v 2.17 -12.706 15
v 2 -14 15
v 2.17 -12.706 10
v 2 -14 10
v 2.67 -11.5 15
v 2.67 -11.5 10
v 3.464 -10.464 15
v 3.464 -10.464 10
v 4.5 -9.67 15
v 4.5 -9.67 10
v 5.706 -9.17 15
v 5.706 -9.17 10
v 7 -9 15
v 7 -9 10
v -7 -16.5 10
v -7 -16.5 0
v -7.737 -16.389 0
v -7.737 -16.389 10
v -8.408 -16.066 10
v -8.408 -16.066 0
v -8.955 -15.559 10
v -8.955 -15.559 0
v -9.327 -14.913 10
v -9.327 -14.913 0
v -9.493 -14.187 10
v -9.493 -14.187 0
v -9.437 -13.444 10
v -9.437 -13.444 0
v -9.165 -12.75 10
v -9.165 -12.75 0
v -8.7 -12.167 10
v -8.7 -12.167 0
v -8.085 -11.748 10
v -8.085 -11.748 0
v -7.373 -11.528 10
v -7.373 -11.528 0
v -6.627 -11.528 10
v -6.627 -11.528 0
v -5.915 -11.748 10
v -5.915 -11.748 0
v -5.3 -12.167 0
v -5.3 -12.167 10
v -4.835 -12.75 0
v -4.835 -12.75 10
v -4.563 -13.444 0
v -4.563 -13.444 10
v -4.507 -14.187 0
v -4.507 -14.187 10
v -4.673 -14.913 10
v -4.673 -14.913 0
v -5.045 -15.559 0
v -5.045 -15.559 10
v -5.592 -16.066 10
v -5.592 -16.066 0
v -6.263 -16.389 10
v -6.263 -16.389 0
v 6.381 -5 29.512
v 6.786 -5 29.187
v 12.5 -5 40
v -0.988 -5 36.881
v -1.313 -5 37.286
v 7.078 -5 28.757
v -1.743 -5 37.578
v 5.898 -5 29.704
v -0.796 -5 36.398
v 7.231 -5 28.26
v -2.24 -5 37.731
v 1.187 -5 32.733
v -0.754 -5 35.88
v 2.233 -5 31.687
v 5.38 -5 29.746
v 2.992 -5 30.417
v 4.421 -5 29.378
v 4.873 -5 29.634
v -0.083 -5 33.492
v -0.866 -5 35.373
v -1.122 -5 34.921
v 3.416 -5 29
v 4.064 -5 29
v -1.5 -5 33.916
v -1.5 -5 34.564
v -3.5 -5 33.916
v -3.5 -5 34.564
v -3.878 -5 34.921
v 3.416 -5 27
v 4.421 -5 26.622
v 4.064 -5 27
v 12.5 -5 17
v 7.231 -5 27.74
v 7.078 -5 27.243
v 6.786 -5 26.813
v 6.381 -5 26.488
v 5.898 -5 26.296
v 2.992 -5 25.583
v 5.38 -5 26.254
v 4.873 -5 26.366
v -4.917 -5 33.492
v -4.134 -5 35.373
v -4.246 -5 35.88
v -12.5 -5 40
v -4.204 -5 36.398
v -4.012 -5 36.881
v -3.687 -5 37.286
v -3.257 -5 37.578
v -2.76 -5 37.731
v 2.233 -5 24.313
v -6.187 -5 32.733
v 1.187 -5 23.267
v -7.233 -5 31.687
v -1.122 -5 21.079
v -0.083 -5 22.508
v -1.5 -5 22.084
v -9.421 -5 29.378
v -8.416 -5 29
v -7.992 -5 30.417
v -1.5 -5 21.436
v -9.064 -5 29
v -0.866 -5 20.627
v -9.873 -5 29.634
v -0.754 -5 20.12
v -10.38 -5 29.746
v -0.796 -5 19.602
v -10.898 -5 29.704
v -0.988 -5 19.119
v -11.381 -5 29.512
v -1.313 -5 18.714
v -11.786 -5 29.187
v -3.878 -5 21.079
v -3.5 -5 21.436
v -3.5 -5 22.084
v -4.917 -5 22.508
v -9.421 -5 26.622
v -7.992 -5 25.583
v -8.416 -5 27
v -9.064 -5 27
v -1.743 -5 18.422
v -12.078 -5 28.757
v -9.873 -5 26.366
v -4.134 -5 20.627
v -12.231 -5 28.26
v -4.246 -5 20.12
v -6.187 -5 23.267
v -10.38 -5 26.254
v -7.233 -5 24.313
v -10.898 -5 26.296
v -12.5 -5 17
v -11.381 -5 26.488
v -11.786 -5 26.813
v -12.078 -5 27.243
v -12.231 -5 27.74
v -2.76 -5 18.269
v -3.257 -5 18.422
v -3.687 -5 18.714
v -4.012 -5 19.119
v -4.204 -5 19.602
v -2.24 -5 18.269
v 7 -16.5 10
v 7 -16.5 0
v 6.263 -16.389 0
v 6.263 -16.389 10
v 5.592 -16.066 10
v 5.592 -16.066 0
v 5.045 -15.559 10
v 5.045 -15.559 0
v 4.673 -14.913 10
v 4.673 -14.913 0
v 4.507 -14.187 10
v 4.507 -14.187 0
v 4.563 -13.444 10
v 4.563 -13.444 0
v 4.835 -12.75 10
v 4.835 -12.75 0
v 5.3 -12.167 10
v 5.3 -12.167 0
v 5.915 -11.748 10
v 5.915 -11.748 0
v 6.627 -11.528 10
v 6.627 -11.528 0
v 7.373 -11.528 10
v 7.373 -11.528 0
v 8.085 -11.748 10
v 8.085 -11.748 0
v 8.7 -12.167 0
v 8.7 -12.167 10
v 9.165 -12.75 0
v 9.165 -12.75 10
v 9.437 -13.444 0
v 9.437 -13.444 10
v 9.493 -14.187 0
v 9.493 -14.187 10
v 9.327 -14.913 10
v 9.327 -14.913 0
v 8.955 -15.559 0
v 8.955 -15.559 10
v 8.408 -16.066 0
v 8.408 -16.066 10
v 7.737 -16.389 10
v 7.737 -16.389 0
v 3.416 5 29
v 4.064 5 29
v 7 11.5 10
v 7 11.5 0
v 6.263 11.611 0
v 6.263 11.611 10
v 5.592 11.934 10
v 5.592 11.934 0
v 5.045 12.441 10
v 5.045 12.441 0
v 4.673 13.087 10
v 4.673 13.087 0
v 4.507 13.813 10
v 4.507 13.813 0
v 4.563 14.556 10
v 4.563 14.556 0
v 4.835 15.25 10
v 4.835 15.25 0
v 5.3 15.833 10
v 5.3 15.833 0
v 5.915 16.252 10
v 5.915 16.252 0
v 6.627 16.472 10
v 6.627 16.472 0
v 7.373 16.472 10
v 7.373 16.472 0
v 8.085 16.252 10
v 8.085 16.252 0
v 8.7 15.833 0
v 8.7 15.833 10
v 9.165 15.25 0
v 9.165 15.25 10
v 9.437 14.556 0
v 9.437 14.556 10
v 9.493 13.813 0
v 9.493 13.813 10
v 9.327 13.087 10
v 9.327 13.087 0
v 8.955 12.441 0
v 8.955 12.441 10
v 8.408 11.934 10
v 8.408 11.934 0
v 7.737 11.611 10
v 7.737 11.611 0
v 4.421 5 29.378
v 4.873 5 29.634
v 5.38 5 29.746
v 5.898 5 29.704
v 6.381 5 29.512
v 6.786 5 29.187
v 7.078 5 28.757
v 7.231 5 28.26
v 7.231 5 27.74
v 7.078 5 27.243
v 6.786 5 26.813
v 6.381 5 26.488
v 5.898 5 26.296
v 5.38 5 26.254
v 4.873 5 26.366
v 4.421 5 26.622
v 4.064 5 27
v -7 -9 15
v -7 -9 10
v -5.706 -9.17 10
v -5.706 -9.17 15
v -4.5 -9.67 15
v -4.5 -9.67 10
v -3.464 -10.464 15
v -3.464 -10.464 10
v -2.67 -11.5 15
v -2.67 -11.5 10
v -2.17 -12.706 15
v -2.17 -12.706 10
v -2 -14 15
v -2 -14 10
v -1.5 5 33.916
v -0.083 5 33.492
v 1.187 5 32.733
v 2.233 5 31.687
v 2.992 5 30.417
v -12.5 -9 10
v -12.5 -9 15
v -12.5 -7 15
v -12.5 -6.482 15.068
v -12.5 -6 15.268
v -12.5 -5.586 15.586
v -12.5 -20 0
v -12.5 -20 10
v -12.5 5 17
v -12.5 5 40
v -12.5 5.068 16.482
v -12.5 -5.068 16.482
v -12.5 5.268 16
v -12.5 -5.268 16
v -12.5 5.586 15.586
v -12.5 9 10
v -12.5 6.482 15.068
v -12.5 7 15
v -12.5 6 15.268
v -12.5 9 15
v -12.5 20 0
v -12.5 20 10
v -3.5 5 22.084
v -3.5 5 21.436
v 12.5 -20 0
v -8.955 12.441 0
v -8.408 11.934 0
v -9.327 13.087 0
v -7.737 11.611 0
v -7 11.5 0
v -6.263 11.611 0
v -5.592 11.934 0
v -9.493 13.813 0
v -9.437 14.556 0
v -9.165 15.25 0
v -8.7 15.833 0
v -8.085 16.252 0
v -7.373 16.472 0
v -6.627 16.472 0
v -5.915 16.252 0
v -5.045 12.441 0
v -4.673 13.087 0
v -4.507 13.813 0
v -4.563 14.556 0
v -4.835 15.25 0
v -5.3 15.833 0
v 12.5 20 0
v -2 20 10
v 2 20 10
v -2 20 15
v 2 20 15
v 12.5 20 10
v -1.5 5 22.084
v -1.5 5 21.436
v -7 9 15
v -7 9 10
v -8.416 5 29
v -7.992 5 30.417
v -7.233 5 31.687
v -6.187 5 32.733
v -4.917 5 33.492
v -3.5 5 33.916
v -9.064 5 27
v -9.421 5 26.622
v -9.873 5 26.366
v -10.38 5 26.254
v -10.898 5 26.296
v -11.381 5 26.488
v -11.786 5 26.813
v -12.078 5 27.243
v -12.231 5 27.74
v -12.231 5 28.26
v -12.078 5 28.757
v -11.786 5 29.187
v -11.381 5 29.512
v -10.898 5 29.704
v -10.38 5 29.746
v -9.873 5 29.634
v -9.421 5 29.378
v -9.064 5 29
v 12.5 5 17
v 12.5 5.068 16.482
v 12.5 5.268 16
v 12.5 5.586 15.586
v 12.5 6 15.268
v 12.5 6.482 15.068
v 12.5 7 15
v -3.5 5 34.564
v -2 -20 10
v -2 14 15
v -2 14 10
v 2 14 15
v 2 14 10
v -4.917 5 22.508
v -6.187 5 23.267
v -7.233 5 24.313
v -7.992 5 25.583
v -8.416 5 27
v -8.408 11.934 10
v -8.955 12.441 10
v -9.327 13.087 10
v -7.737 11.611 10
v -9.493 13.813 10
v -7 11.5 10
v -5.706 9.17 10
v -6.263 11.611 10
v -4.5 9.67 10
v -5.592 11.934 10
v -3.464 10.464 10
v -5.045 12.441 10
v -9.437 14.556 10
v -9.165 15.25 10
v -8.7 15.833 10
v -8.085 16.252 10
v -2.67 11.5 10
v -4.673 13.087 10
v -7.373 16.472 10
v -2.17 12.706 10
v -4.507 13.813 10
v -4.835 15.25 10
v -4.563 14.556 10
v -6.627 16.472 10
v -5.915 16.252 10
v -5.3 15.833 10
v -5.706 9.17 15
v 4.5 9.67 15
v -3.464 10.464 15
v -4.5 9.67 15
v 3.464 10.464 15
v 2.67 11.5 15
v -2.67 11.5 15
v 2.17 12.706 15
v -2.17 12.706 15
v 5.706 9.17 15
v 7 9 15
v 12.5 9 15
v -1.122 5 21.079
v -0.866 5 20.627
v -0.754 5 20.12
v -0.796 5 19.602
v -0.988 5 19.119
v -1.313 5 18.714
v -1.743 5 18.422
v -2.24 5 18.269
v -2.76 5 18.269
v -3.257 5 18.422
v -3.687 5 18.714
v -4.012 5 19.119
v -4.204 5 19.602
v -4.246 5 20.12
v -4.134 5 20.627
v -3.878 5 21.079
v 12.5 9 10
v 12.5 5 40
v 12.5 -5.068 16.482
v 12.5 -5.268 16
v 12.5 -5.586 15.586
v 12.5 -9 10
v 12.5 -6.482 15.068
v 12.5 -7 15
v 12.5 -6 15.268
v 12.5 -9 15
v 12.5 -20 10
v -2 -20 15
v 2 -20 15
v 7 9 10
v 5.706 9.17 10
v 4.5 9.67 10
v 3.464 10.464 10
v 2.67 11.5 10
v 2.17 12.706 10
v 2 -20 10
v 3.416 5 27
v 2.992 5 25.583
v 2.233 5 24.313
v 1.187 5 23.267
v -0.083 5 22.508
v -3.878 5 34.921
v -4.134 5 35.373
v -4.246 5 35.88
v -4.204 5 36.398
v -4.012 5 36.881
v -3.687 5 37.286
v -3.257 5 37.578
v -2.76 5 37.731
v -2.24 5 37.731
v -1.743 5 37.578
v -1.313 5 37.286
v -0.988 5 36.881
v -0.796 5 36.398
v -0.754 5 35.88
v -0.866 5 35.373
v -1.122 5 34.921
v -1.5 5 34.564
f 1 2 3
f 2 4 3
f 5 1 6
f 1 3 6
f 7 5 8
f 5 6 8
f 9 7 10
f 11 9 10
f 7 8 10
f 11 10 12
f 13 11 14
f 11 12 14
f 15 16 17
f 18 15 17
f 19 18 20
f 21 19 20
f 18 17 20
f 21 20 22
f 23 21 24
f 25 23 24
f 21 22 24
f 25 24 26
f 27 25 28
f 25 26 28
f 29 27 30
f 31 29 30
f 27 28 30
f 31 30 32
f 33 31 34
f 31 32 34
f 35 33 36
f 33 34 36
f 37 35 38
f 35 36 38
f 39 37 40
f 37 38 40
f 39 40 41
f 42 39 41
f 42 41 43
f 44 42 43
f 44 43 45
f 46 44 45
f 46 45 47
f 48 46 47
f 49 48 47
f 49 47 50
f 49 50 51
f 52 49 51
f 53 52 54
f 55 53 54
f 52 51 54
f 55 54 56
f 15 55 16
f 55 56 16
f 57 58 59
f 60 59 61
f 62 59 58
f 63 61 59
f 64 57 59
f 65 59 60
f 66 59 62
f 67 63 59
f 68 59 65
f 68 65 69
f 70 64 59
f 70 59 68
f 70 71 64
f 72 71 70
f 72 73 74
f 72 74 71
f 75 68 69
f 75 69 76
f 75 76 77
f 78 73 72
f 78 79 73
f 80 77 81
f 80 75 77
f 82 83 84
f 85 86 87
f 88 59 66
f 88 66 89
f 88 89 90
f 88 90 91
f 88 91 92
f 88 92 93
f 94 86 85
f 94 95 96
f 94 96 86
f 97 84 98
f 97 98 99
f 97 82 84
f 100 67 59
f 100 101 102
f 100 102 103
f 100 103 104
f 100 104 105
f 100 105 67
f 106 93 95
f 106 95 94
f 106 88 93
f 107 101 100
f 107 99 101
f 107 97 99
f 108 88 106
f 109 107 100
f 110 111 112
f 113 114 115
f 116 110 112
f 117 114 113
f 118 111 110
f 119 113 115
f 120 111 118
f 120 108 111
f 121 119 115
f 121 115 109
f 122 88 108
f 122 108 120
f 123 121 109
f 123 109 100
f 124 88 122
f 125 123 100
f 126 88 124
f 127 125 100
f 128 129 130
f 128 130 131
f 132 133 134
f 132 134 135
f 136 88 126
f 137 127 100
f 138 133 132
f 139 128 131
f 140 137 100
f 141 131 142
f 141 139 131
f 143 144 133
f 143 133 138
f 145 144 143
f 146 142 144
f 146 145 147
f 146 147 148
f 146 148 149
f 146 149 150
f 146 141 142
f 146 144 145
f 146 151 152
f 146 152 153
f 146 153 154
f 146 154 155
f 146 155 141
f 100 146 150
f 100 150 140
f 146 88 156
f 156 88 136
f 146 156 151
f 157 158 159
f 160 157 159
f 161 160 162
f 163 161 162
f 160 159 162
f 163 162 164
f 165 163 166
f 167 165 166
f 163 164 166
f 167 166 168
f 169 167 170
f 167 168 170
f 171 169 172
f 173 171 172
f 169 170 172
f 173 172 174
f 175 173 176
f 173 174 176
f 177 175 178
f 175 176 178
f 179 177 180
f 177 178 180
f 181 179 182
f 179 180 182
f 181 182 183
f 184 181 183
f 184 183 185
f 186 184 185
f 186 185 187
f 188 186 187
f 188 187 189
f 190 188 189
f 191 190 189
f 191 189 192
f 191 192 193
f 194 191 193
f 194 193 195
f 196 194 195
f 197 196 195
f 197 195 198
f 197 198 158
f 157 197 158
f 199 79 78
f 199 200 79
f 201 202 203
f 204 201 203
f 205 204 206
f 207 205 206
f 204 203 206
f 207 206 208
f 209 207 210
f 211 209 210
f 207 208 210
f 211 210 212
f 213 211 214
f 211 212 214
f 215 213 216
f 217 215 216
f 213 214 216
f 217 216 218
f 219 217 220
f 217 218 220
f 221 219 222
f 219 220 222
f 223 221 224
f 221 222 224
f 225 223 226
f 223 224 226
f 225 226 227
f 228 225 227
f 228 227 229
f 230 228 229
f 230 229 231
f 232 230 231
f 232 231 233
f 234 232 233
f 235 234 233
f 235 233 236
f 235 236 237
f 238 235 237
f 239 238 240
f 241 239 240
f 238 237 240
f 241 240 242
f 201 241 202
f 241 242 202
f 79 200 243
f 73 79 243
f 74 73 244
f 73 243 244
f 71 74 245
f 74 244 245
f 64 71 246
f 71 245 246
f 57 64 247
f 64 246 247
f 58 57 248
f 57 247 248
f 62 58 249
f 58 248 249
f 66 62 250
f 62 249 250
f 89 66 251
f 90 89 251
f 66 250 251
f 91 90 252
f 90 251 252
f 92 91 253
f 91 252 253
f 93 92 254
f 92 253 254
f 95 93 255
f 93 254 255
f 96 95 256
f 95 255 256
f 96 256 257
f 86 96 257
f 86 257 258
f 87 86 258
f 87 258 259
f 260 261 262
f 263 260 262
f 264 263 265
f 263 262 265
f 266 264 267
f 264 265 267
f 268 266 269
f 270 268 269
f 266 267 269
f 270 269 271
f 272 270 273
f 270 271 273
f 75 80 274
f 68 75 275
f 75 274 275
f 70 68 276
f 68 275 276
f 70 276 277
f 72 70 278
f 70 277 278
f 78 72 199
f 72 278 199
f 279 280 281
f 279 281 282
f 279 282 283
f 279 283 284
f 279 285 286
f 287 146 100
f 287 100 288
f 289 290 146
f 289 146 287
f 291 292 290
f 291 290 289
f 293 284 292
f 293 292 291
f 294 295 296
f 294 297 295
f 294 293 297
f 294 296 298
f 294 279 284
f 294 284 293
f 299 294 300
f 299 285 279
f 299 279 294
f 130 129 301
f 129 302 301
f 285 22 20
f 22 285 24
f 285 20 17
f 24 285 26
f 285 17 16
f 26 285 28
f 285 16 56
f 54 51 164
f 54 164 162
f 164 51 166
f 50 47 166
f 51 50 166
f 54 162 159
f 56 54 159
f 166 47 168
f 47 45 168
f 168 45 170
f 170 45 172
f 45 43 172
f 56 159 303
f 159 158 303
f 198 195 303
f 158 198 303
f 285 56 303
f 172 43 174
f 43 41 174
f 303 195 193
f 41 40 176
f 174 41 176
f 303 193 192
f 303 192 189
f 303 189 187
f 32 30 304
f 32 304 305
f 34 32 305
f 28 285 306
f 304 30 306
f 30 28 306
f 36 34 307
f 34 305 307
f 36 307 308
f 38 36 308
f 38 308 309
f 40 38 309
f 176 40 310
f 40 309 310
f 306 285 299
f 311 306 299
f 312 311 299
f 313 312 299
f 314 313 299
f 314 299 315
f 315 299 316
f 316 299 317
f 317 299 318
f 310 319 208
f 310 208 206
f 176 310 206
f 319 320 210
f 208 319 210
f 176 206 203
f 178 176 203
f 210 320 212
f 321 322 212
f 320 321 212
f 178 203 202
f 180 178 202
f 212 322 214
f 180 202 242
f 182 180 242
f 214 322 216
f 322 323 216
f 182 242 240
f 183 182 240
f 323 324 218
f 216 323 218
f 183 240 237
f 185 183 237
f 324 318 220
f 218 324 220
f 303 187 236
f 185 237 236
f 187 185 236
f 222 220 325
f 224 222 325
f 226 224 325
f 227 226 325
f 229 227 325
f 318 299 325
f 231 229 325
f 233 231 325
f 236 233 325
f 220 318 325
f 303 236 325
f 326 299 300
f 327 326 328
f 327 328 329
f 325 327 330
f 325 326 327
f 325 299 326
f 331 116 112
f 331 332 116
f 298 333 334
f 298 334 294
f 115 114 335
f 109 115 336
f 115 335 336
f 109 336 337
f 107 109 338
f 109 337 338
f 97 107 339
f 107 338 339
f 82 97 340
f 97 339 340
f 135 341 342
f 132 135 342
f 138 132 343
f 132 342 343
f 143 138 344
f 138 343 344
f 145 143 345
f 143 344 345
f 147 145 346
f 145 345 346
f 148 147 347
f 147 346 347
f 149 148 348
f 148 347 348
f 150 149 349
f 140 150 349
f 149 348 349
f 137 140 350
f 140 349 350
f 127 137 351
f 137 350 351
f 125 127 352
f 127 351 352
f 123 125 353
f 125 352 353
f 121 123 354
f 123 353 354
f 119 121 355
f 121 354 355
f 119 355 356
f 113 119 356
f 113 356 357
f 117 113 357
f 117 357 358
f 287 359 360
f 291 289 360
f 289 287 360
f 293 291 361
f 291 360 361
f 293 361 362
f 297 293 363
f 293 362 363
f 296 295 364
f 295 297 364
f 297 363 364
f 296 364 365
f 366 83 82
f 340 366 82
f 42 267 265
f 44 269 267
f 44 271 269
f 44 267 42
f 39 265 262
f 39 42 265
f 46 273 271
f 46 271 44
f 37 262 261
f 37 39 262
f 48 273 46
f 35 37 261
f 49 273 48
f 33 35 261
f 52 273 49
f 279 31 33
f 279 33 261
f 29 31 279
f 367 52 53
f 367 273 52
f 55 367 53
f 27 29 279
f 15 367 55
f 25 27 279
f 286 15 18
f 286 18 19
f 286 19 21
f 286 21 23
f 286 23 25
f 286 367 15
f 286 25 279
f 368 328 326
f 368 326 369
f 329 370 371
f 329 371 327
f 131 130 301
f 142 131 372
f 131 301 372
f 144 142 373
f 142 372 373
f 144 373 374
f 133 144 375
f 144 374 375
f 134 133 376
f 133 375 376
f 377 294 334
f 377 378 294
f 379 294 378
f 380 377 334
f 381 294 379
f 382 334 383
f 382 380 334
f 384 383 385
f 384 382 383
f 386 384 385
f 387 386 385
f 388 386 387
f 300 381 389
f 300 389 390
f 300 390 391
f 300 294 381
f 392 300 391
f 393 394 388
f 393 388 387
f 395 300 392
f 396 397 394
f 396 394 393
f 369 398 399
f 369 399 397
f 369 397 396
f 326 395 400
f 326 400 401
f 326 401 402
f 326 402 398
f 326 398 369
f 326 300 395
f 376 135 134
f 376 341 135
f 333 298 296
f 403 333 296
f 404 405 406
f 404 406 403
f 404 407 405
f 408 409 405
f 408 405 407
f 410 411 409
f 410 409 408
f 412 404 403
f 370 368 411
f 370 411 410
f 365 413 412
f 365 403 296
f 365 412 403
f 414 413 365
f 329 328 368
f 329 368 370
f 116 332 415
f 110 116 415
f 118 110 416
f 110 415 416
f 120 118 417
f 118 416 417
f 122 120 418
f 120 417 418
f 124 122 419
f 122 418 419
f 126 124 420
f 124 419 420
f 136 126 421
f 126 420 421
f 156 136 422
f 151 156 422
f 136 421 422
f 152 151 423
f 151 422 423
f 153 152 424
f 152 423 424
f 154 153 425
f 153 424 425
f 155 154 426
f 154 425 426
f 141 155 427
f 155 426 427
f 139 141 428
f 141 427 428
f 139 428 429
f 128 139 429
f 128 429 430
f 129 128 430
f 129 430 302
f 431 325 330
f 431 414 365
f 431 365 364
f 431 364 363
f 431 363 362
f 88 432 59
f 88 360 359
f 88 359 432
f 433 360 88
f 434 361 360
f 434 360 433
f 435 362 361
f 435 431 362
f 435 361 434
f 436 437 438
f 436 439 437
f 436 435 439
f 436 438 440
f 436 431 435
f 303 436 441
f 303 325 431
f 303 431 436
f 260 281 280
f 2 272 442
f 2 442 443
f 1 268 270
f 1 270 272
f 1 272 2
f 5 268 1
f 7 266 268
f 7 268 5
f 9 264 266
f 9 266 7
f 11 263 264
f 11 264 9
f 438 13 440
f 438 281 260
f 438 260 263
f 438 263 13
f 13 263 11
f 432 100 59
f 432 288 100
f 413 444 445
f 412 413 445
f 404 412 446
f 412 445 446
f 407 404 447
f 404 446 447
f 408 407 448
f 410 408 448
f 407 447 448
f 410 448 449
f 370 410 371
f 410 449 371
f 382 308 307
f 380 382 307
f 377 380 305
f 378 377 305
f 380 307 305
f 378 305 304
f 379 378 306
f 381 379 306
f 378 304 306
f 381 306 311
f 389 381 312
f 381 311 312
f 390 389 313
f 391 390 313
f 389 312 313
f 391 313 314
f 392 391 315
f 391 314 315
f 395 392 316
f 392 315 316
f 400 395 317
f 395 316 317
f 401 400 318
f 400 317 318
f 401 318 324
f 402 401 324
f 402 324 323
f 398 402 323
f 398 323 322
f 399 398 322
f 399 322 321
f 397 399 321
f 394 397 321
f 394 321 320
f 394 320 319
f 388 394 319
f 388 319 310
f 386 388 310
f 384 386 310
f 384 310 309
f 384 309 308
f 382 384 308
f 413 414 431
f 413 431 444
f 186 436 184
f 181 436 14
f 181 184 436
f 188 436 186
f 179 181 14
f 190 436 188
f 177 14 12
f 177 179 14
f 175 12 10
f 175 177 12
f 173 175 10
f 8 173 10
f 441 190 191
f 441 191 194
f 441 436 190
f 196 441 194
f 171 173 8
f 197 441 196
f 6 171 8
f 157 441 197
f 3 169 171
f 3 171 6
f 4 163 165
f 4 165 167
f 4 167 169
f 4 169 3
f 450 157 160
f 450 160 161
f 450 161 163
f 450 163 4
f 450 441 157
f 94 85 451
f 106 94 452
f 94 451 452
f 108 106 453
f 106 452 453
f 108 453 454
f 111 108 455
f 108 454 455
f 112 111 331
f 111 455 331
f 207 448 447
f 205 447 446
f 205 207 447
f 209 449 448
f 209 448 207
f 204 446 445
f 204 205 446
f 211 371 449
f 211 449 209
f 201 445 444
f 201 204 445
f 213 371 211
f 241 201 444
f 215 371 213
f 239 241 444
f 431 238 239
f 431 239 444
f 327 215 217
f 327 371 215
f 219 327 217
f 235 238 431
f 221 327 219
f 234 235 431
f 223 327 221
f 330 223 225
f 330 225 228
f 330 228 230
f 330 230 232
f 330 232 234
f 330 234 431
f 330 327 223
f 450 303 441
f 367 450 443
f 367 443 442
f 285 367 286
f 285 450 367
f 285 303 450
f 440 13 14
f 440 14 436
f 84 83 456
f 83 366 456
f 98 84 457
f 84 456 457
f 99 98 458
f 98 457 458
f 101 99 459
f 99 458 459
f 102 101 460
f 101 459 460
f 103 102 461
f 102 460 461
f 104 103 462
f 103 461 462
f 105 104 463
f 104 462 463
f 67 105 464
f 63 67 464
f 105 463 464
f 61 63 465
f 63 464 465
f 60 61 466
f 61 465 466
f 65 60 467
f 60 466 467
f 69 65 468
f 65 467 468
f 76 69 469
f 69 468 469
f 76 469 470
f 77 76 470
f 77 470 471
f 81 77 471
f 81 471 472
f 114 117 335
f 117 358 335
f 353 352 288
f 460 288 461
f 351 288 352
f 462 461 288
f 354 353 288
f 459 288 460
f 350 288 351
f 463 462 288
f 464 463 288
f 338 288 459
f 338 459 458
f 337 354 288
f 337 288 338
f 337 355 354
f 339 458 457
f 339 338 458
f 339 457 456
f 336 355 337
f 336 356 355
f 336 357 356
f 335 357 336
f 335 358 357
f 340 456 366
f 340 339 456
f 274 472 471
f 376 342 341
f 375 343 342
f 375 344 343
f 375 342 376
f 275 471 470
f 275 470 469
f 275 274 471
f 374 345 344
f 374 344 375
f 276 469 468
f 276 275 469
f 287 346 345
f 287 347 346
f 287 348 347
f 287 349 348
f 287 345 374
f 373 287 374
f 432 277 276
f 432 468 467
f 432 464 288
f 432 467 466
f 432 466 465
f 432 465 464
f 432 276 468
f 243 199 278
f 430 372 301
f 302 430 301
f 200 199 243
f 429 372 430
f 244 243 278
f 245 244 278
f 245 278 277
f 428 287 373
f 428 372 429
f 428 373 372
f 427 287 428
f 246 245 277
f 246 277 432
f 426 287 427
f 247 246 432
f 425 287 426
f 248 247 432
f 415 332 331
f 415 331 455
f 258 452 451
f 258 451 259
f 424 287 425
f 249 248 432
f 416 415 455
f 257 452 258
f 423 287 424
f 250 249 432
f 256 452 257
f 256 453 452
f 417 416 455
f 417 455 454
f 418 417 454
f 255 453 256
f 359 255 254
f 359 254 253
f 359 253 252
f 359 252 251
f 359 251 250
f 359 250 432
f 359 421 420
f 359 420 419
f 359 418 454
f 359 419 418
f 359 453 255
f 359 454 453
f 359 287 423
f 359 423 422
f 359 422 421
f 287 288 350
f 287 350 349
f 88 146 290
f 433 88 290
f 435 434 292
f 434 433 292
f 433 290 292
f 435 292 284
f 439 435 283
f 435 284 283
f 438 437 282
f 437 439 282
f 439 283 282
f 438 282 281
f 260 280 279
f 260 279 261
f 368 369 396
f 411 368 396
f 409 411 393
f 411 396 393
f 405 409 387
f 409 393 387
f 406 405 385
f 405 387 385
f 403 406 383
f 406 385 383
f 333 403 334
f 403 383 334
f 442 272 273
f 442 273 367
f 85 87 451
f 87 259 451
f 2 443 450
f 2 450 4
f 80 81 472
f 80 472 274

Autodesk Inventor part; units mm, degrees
ref_plane "YZ Plane" through (0, 0, 0) normal (1, 0, 0) x (0, 1, 0)
ref_plane "XZ Plane" through (0, 0, 0) normal (0, 1, 0) x (-1, 0, 0)
ref_plane "XY Plane" through (0, 0, 0) normal (0, 0, 1) x (1, 0, 0)
sketch "Sketch1" plane through (0, 0, 0) normal (0, 0, 1) x (1, 0, 0)
  line L0 (-12.5, 20) -> (12.5, 20)
  line L1 (12.5, 20) -> (12.5, -20)
  line L2 (12.5, -20) -> (-12.5, -20)
  line L3 (-12.5, -20) -> (-12.5, 20)
  point P0 (0, 0)
  point P1 (-12.5, 0)
  point P2 (0, 20)
  dimension "d0" = 40
  dimension "d1" = 25
extrude "Extrusion1" add sketch "Sketch1" along normal blind 15
sketch "Sketch3" plane through (0, 0, 15) normal (0, 0, -1) x (-1, 0, 0)
  line L0 (-12.5, -20) -> (-12.5, 20) projected
  line L1 (-12.5, -20) -> (-12.5, 20) projected
  line L2 (12.5, -20) -> (-12.5, -20) projected
  line L3 (-12.5, 20) -> (12.5, 20) projected
  line L4 (0, 0) -> (0, 4.9357) construction
  point P0 (-7, -14)
  point P1 (-7, 14)
  point P2 (0, -20)
  point P3 (0, 20)
  point P4 (7, -14)
  point P5 (7, 14)
  dimension "d21" = 6
  dimension "d22" = 6
  dimension "d24" = 5.5
hole "Hole1" at (7, -14, 15) at (-7, -14, 15) at (-7, 14, 15) at (7, 14, 15) direction (0, 0, -1) diameter 5 end through all counterbore diameter 10 counterbore depth 5
sketch "Sketch4" plane through (0, 0, 15) normal (0, 0, 1) x (1, 0, 0)
  line L0 (-12.5, 5) -> (12.5, 5)
  line L1 (12.5, 5) -> (12.5, -5)
  line L2 (12.5, -5) -> (-12.5, -5)
  line L3 (-12.5, -5) -> (-12.5, 5)
  line L4 (12.5, -20) -> (12.5, 20) projected
  line L5 (-12.5, 20) -> (-12.5, -20) projected
  point P0 (0, 0)
  point P1 (12.5, 0)
  dimension "d20" = 10
extrude "Extrusion3" add sketch "Sketch4" along normal blind 25
sketch "Sketch5" plane through (-12.5, 5, 15) normal (0, 1, 0) x (1, 0, 0)
  circle A0 centre (10, -13) radius 6
  line L0 (25, -25) -> (0, -25) projected
  line L1 (25, 0) -> (25, -25) projected
  circle A1 centre (10, -5) radius 1.75
  circle A2 centre (2, -13) radius 1.75
  circle A3 centre (10, -21) radius 1.75
  circle A4 centre (18, -13) radius 1.75
  point P0 (12.5, 15)
  dimension "d27" = 12
  dimension "d28" = 12
  dimension "d29" = 15
  dimension "d30" = 3.5
  dimension "d31" = 8
  dimension "d34" = 360
extrude "Extrusion4" cut sketch "Sketch5" against normal through all
fillet "Fillet2" radius 2 2 edges at (0, 5, 15) (0, -5, 15)
sketch "Sketch6" plane through (0, 0, 15) normal (0, 0, 1) x (1, 0, 0)
  line L0 (12.5, 7) -> (12.5, 20) projected
  line L1 (12.5, 9) -> (7, 9)
  circle A0 centre (7, 14) radius 5 projected
  line L2 (2, 14) -> (2, 20)
  line L3 (12.5, 20) -> (-12.5, 20) projected
  point P0 (0, 0)
extrude "Extrusion5" cut sketch "Sketch6" against normal up to surface (5 mm away) contours L1 A0 L2 L3 L0
mirror "Mirror1" about plane through (0, 0, 0) normal (1, 0, 0) of "Extrusion5"
mirror "Mirror2" about plane through (0, 0, 0) normal (0, 1, 0) of "Extrusion5", "Mirror1"
sketch "Sketch7" plane through (-12.5, 5, 40) normal (0, 1, 0) x (1, 0, 0)
  circle A0 centre (10, 4) radius 1.75 projected
  circle A1 centre (18, 12) radius 1.75 projected
  circle A2 centre (10, 20) radius 1.75 projected
  circle A3 centre (2, 12) radius 1.75 projected
  circle A4 centre (10, 12) radius 6 projected
  line L0 (0, 23) -> (0, 0) projected
  line L1 (11, 5.4361) -> (11, 6.0839)
  line L2 (9, 5.4361) -> (9, 6.0839)
  line L3 (25, 23) -> (25, 0) projected
  point P0 (12.5, 40)
  dimension "d41" = 1
  dimension "d42" = 1
extrude "Extrusion6" cut sketch "Sketch7" against normal through all contours A0 L2 A4 L1
pattern_circular "Circular Pattern1" count 4 over 360 about axis through (-2.5, 5, 28) along (0, -1, 0) of "Extrusion6"
equation "\"d22\" = d21"
equation "\"d42\" = d41"
properties part number "0008-10-013 Supăort Piulita Axa Z1"
